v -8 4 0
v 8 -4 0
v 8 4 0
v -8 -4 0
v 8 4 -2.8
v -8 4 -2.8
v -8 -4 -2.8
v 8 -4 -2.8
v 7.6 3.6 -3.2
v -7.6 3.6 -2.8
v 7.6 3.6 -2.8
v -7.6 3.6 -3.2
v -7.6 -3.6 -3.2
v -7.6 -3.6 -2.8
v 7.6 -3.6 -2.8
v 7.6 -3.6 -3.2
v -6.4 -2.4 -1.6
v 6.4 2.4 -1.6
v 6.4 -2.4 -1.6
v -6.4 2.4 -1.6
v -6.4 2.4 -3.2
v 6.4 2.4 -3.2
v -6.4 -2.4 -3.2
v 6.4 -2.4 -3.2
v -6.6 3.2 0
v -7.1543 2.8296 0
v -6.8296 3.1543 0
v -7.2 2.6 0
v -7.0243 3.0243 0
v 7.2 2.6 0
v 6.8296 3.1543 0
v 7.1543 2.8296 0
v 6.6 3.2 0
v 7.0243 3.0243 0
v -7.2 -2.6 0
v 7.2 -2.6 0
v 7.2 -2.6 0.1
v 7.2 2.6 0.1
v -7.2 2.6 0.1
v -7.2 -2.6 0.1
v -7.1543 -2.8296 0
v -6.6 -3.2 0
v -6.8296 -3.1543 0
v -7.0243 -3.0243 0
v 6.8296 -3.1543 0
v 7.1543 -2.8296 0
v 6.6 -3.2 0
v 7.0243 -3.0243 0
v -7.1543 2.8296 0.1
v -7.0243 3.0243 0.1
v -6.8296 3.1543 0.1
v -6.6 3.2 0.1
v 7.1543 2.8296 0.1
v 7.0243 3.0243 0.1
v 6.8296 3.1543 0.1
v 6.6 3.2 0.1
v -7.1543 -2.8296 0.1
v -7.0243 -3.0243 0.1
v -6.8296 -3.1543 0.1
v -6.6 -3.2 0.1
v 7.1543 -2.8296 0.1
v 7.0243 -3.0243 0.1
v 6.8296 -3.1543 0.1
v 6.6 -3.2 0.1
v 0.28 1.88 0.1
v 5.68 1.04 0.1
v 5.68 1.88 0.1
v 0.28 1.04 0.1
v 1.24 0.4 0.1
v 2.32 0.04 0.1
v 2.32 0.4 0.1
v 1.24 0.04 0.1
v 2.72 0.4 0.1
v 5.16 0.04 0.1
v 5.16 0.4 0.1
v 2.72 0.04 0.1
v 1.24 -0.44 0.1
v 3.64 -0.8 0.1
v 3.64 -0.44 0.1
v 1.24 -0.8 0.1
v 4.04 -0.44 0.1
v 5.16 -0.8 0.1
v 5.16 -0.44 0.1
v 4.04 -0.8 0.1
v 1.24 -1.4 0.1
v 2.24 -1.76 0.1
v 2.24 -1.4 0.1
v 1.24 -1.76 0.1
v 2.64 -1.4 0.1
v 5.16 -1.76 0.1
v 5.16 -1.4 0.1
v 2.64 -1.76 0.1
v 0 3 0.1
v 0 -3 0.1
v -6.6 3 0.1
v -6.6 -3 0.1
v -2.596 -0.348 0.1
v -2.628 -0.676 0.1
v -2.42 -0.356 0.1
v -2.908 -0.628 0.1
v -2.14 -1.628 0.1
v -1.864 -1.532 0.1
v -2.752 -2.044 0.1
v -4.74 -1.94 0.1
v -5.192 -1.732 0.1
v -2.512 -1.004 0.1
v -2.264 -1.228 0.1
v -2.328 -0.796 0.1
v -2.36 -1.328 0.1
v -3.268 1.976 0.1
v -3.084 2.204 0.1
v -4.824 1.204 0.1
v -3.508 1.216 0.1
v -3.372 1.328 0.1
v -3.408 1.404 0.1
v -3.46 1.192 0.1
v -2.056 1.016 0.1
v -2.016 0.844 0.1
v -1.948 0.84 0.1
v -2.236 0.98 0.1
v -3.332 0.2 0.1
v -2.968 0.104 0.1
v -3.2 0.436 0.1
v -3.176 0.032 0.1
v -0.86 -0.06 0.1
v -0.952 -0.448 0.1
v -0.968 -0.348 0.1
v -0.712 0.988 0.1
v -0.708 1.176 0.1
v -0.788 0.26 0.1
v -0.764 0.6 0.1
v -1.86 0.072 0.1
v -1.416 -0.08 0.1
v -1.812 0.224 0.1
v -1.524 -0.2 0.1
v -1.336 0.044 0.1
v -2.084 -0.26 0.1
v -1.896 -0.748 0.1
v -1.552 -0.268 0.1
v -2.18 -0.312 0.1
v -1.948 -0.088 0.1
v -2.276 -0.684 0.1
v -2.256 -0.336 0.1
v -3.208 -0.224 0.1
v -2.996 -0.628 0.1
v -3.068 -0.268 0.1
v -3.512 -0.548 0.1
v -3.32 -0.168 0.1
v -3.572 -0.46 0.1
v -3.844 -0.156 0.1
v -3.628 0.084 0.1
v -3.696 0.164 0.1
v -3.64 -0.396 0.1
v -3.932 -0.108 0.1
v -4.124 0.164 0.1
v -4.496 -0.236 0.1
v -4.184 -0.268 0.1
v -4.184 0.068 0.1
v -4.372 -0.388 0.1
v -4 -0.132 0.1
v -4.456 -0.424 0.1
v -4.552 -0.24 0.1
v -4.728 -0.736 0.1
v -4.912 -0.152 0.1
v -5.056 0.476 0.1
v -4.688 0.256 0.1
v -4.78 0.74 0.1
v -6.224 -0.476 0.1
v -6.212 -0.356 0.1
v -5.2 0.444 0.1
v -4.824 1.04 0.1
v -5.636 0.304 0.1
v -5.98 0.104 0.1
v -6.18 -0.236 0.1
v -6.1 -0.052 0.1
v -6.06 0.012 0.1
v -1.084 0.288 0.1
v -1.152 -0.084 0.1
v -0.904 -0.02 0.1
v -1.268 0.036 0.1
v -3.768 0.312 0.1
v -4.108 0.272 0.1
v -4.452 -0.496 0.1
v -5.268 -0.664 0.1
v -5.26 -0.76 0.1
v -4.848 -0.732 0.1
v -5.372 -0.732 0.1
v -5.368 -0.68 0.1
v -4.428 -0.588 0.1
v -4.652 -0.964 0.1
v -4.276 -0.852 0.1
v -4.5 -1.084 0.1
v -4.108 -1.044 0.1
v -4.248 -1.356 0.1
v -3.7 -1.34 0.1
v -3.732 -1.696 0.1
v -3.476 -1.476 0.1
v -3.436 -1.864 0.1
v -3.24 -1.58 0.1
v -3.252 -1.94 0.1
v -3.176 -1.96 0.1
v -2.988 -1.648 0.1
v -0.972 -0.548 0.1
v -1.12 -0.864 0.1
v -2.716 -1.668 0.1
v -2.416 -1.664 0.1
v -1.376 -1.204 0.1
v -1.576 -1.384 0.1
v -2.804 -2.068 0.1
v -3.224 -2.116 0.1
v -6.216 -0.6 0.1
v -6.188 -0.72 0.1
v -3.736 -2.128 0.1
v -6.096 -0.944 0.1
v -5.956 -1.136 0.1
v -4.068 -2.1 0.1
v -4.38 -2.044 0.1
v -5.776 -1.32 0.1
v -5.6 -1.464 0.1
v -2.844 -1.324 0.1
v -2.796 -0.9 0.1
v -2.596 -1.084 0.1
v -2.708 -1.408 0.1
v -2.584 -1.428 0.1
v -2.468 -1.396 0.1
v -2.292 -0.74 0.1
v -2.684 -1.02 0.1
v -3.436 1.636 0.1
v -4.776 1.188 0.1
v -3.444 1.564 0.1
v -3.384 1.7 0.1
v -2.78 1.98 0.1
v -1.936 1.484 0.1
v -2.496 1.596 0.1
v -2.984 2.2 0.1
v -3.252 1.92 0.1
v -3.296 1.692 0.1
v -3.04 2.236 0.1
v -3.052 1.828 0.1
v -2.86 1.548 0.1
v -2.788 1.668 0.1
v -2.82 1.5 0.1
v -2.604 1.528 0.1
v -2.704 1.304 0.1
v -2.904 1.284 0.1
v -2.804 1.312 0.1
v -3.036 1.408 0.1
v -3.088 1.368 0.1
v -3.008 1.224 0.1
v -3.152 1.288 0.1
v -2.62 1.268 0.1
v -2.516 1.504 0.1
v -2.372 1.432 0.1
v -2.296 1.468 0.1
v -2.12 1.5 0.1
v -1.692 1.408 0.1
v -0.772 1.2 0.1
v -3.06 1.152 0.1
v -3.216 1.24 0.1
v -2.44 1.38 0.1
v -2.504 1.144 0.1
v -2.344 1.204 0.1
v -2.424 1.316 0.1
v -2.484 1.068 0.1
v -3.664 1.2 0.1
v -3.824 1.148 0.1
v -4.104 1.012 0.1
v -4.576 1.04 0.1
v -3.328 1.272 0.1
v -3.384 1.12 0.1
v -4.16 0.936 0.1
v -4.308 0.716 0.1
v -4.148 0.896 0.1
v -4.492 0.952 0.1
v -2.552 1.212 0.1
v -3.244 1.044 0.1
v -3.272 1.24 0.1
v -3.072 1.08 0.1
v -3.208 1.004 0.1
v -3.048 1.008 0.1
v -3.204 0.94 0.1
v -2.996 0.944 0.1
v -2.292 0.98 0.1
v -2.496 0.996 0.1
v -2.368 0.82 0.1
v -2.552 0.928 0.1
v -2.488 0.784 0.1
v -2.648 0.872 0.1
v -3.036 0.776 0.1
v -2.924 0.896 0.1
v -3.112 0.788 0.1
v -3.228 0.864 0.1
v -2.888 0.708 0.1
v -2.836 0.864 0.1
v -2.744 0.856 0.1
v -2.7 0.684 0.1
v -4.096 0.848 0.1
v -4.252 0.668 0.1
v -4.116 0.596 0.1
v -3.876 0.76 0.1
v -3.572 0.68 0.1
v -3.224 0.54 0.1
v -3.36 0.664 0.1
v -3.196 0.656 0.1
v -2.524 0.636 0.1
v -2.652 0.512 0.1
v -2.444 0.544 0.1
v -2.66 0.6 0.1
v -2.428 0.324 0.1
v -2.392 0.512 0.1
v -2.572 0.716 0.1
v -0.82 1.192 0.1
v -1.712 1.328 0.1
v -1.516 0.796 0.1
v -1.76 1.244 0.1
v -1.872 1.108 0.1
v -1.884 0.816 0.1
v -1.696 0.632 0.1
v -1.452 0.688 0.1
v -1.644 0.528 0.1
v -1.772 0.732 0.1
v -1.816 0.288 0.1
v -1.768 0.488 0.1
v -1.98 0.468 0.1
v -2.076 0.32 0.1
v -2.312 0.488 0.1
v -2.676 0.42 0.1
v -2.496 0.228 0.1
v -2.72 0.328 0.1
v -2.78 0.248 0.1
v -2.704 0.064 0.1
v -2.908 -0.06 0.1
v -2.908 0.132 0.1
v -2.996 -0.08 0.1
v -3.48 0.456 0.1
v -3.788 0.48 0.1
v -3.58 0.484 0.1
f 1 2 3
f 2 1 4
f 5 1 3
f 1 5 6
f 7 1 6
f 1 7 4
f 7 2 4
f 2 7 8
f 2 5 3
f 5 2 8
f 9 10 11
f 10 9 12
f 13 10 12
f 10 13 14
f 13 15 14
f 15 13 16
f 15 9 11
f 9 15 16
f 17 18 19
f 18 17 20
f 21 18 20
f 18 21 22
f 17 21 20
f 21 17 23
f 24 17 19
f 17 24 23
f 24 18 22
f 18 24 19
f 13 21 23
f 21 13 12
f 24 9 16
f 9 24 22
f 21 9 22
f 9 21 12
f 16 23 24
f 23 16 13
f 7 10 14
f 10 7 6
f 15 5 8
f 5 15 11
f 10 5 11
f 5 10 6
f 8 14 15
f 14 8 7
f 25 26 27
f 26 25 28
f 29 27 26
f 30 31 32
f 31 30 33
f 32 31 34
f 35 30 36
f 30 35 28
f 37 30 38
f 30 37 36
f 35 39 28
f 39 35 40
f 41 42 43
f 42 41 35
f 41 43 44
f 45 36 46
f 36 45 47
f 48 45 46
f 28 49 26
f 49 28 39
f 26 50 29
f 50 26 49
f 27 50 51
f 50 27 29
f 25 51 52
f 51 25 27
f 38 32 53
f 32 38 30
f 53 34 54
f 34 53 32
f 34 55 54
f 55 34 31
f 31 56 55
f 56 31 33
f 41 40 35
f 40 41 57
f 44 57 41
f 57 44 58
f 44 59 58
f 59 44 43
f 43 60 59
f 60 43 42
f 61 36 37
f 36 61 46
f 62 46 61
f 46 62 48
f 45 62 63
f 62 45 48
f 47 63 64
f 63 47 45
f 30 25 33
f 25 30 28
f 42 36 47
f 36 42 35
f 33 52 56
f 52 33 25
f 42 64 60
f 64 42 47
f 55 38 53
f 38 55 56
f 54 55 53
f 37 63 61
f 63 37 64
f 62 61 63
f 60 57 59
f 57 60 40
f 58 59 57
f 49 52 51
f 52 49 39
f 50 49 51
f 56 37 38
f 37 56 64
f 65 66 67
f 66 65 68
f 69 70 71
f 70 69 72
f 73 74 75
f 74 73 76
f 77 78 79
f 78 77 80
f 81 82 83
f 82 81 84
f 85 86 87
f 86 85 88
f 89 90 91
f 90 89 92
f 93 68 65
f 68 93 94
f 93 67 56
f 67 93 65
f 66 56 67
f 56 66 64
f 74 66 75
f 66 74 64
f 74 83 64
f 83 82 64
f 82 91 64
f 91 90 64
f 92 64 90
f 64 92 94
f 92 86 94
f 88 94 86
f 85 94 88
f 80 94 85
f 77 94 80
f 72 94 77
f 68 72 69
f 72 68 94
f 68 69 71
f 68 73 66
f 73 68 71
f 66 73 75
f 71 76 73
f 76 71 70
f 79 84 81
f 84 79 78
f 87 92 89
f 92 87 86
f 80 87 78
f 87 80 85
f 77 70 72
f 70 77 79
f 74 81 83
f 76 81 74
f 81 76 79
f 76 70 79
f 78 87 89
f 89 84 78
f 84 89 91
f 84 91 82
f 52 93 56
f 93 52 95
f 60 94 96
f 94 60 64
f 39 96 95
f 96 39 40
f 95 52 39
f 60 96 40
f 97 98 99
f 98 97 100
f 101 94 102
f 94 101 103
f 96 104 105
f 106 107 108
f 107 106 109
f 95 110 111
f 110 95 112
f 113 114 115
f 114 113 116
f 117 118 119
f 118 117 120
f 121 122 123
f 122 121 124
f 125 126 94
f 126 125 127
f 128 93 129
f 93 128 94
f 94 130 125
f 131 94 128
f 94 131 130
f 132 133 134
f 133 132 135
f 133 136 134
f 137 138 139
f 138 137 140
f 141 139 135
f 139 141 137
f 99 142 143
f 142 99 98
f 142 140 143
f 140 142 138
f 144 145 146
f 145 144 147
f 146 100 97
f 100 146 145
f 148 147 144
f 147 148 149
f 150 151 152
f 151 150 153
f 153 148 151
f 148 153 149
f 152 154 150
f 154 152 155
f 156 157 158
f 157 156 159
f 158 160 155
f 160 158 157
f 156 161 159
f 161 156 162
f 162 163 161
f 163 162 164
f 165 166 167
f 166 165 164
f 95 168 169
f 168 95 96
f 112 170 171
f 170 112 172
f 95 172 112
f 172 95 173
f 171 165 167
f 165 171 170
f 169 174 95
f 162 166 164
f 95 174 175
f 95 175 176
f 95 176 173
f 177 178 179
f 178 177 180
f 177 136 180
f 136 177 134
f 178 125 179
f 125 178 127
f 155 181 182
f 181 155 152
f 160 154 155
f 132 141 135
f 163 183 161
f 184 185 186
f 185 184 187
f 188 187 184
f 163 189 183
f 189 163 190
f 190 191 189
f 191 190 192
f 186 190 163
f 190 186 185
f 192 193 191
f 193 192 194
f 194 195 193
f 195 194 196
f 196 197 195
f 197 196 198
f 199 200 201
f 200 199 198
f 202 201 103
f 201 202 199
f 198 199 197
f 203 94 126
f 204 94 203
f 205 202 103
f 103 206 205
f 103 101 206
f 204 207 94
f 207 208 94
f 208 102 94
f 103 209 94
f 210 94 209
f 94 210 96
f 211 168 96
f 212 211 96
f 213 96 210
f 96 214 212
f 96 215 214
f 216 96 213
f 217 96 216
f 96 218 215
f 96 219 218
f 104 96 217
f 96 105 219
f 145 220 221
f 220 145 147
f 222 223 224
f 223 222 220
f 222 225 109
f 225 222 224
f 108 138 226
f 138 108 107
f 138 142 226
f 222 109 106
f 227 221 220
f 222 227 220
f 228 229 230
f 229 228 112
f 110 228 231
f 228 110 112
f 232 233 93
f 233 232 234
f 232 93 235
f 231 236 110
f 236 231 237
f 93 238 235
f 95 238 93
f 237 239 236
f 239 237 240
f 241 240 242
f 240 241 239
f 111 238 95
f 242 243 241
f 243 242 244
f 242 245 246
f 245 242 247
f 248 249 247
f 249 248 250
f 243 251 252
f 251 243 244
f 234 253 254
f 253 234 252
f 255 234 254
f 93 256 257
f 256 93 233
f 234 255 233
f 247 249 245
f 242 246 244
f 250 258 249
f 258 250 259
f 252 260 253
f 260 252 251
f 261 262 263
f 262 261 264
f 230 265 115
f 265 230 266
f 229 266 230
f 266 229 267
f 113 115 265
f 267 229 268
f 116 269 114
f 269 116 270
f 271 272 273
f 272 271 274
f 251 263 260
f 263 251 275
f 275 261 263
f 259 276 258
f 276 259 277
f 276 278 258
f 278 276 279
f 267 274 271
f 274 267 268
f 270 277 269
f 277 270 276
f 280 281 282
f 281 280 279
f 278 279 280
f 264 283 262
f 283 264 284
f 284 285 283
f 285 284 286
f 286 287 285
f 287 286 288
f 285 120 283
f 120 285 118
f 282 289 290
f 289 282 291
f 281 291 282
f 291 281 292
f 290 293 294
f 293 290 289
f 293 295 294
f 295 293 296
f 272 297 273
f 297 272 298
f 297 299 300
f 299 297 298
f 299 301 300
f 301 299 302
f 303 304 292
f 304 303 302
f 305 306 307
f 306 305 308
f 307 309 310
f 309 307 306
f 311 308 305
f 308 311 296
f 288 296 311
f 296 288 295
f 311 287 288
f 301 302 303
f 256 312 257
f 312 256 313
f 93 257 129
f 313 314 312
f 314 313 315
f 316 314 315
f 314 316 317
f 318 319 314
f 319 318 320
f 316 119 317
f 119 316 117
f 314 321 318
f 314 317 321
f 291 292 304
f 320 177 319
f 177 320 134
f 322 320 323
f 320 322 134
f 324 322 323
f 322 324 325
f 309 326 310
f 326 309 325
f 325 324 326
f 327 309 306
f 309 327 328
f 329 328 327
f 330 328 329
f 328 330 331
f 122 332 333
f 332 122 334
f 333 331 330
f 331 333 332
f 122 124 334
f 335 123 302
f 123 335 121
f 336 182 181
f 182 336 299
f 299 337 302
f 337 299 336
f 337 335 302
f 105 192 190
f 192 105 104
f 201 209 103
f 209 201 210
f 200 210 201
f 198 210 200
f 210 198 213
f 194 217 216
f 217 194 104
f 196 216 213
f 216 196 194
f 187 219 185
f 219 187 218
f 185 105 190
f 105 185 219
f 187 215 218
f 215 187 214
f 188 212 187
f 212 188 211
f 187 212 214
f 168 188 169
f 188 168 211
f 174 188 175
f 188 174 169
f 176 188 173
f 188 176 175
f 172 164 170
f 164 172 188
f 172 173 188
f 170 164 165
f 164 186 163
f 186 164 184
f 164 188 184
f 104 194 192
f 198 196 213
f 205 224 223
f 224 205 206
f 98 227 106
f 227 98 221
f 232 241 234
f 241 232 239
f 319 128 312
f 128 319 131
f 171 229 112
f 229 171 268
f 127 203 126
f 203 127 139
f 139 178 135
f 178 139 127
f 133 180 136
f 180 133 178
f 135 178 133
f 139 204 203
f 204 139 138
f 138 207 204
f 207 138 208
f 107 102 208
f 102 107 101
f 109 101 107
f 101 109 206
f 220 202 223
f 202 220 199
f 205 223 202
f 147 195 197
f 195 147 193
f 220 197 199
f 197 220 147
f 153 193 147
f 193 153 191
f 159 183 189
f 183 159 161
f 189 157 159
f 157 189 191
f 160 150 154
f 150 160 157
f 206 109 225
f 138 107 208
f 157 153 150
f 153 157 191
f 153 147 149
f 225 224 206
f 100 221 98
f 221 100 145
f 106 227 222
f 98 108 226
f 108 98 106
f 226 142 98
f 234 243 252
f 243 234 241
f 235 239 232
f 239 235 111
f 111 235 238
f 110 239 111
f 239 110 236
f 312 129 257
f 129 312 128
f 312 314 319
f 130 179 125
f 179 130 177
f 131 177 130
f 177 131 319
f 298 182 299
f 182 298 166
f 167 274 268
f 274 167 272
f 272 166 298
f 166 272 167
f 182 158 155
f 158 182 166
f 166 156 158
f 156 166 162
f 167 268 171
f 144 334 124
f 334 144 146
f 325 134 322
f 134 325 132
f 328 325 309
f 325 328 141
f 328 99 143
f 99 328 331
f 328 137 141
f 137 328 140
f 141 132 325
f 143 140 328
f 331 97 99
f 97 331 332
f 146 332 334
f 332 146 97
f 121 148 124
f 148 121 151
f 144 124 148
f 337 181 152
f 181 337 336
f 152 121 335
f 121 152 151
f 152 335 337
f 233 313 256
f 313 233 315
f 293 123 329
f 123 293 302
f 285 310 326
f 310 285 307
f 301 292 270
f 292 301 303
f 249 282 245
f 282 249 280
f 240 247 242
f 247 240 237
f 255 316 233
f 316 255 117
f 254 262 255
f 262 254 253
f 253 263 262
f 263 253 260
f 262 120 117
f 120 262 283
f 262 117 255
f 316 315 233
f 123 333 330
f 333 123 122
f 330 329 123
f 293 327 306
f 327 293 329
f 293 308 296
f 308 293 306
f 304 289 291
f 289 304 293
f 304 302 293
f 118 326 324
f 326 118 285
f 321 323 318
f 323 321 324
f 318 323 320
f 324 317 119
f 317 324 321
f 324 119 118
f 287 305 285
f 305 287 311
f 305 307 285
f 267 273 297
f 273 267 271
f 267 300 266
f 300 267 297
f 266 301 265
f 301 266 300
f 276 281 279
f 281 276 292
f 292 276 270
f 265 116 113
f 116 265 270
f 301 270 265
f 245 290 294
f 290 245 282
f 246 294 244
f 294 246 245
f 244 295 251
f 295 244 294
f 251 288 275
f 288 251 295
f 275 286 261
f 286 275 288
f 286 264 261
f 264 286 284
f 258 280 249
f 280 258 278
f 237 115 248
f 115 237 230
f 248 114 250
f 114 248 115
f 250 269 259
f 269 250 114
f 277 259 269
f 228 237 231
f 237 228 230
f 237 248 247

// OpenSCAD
use <../lib.scad>
use <3069b.scad>
use <6435269c.scad>
function ldraw_lib__3069bd1a() = [
// 0 Tile  1 x  2 with Nelumbo Nucifera Sign Sticker
// 0 Name: 3069bd1a.dat
// 0 Author: Philippe Hurbain [Philo]
// 0 !LDRAW_ORG Shortcut UPDATE 2025-08
// 0 !LICENSE Licensed under CC BY 4.0 : see CAreadme.txt
// 
// 0 BFC CERTIFY CCW
  [0,"BFC","CERTIFY"],
  [0,"BFC","CCW"],
// 
// 0 !CATEGORY Sticker Shortcut
// 0 !KEYWORDS Bricklink 41757stk01, Rebrickable 10109627, Set 41757
// 
// 0 !HISTORY 2025-08-31 [OrionP] Official Update 2025-08
// 
// 1 16 0 0 0 1 0 0 0 1 0 0 0 1 3069b.dat
  [1,16,0,0,0,1,0,0,0,1,0,0,0,1, ldraw_lib__3069b()],
// 1 16 0 0 0 1 0 0 0 1 0 0 0 1 6435269c.dat
  [1,16,0,0,0,1,0,0,0,1,0,0,0,1, ldraw_lib__6435269c()],
];
module ldraw_lib__3069bd1a(step=0, col=false, unit=2/5, alt=false, line=0.2, solid=!$preview)
    makepoly(ldraw_lib__3069bd1a(), step=step, col=col, unit=unit, alt=alt, line=line, solid=solid);
ldraw_lib__3069bd1a(line=0.2);
